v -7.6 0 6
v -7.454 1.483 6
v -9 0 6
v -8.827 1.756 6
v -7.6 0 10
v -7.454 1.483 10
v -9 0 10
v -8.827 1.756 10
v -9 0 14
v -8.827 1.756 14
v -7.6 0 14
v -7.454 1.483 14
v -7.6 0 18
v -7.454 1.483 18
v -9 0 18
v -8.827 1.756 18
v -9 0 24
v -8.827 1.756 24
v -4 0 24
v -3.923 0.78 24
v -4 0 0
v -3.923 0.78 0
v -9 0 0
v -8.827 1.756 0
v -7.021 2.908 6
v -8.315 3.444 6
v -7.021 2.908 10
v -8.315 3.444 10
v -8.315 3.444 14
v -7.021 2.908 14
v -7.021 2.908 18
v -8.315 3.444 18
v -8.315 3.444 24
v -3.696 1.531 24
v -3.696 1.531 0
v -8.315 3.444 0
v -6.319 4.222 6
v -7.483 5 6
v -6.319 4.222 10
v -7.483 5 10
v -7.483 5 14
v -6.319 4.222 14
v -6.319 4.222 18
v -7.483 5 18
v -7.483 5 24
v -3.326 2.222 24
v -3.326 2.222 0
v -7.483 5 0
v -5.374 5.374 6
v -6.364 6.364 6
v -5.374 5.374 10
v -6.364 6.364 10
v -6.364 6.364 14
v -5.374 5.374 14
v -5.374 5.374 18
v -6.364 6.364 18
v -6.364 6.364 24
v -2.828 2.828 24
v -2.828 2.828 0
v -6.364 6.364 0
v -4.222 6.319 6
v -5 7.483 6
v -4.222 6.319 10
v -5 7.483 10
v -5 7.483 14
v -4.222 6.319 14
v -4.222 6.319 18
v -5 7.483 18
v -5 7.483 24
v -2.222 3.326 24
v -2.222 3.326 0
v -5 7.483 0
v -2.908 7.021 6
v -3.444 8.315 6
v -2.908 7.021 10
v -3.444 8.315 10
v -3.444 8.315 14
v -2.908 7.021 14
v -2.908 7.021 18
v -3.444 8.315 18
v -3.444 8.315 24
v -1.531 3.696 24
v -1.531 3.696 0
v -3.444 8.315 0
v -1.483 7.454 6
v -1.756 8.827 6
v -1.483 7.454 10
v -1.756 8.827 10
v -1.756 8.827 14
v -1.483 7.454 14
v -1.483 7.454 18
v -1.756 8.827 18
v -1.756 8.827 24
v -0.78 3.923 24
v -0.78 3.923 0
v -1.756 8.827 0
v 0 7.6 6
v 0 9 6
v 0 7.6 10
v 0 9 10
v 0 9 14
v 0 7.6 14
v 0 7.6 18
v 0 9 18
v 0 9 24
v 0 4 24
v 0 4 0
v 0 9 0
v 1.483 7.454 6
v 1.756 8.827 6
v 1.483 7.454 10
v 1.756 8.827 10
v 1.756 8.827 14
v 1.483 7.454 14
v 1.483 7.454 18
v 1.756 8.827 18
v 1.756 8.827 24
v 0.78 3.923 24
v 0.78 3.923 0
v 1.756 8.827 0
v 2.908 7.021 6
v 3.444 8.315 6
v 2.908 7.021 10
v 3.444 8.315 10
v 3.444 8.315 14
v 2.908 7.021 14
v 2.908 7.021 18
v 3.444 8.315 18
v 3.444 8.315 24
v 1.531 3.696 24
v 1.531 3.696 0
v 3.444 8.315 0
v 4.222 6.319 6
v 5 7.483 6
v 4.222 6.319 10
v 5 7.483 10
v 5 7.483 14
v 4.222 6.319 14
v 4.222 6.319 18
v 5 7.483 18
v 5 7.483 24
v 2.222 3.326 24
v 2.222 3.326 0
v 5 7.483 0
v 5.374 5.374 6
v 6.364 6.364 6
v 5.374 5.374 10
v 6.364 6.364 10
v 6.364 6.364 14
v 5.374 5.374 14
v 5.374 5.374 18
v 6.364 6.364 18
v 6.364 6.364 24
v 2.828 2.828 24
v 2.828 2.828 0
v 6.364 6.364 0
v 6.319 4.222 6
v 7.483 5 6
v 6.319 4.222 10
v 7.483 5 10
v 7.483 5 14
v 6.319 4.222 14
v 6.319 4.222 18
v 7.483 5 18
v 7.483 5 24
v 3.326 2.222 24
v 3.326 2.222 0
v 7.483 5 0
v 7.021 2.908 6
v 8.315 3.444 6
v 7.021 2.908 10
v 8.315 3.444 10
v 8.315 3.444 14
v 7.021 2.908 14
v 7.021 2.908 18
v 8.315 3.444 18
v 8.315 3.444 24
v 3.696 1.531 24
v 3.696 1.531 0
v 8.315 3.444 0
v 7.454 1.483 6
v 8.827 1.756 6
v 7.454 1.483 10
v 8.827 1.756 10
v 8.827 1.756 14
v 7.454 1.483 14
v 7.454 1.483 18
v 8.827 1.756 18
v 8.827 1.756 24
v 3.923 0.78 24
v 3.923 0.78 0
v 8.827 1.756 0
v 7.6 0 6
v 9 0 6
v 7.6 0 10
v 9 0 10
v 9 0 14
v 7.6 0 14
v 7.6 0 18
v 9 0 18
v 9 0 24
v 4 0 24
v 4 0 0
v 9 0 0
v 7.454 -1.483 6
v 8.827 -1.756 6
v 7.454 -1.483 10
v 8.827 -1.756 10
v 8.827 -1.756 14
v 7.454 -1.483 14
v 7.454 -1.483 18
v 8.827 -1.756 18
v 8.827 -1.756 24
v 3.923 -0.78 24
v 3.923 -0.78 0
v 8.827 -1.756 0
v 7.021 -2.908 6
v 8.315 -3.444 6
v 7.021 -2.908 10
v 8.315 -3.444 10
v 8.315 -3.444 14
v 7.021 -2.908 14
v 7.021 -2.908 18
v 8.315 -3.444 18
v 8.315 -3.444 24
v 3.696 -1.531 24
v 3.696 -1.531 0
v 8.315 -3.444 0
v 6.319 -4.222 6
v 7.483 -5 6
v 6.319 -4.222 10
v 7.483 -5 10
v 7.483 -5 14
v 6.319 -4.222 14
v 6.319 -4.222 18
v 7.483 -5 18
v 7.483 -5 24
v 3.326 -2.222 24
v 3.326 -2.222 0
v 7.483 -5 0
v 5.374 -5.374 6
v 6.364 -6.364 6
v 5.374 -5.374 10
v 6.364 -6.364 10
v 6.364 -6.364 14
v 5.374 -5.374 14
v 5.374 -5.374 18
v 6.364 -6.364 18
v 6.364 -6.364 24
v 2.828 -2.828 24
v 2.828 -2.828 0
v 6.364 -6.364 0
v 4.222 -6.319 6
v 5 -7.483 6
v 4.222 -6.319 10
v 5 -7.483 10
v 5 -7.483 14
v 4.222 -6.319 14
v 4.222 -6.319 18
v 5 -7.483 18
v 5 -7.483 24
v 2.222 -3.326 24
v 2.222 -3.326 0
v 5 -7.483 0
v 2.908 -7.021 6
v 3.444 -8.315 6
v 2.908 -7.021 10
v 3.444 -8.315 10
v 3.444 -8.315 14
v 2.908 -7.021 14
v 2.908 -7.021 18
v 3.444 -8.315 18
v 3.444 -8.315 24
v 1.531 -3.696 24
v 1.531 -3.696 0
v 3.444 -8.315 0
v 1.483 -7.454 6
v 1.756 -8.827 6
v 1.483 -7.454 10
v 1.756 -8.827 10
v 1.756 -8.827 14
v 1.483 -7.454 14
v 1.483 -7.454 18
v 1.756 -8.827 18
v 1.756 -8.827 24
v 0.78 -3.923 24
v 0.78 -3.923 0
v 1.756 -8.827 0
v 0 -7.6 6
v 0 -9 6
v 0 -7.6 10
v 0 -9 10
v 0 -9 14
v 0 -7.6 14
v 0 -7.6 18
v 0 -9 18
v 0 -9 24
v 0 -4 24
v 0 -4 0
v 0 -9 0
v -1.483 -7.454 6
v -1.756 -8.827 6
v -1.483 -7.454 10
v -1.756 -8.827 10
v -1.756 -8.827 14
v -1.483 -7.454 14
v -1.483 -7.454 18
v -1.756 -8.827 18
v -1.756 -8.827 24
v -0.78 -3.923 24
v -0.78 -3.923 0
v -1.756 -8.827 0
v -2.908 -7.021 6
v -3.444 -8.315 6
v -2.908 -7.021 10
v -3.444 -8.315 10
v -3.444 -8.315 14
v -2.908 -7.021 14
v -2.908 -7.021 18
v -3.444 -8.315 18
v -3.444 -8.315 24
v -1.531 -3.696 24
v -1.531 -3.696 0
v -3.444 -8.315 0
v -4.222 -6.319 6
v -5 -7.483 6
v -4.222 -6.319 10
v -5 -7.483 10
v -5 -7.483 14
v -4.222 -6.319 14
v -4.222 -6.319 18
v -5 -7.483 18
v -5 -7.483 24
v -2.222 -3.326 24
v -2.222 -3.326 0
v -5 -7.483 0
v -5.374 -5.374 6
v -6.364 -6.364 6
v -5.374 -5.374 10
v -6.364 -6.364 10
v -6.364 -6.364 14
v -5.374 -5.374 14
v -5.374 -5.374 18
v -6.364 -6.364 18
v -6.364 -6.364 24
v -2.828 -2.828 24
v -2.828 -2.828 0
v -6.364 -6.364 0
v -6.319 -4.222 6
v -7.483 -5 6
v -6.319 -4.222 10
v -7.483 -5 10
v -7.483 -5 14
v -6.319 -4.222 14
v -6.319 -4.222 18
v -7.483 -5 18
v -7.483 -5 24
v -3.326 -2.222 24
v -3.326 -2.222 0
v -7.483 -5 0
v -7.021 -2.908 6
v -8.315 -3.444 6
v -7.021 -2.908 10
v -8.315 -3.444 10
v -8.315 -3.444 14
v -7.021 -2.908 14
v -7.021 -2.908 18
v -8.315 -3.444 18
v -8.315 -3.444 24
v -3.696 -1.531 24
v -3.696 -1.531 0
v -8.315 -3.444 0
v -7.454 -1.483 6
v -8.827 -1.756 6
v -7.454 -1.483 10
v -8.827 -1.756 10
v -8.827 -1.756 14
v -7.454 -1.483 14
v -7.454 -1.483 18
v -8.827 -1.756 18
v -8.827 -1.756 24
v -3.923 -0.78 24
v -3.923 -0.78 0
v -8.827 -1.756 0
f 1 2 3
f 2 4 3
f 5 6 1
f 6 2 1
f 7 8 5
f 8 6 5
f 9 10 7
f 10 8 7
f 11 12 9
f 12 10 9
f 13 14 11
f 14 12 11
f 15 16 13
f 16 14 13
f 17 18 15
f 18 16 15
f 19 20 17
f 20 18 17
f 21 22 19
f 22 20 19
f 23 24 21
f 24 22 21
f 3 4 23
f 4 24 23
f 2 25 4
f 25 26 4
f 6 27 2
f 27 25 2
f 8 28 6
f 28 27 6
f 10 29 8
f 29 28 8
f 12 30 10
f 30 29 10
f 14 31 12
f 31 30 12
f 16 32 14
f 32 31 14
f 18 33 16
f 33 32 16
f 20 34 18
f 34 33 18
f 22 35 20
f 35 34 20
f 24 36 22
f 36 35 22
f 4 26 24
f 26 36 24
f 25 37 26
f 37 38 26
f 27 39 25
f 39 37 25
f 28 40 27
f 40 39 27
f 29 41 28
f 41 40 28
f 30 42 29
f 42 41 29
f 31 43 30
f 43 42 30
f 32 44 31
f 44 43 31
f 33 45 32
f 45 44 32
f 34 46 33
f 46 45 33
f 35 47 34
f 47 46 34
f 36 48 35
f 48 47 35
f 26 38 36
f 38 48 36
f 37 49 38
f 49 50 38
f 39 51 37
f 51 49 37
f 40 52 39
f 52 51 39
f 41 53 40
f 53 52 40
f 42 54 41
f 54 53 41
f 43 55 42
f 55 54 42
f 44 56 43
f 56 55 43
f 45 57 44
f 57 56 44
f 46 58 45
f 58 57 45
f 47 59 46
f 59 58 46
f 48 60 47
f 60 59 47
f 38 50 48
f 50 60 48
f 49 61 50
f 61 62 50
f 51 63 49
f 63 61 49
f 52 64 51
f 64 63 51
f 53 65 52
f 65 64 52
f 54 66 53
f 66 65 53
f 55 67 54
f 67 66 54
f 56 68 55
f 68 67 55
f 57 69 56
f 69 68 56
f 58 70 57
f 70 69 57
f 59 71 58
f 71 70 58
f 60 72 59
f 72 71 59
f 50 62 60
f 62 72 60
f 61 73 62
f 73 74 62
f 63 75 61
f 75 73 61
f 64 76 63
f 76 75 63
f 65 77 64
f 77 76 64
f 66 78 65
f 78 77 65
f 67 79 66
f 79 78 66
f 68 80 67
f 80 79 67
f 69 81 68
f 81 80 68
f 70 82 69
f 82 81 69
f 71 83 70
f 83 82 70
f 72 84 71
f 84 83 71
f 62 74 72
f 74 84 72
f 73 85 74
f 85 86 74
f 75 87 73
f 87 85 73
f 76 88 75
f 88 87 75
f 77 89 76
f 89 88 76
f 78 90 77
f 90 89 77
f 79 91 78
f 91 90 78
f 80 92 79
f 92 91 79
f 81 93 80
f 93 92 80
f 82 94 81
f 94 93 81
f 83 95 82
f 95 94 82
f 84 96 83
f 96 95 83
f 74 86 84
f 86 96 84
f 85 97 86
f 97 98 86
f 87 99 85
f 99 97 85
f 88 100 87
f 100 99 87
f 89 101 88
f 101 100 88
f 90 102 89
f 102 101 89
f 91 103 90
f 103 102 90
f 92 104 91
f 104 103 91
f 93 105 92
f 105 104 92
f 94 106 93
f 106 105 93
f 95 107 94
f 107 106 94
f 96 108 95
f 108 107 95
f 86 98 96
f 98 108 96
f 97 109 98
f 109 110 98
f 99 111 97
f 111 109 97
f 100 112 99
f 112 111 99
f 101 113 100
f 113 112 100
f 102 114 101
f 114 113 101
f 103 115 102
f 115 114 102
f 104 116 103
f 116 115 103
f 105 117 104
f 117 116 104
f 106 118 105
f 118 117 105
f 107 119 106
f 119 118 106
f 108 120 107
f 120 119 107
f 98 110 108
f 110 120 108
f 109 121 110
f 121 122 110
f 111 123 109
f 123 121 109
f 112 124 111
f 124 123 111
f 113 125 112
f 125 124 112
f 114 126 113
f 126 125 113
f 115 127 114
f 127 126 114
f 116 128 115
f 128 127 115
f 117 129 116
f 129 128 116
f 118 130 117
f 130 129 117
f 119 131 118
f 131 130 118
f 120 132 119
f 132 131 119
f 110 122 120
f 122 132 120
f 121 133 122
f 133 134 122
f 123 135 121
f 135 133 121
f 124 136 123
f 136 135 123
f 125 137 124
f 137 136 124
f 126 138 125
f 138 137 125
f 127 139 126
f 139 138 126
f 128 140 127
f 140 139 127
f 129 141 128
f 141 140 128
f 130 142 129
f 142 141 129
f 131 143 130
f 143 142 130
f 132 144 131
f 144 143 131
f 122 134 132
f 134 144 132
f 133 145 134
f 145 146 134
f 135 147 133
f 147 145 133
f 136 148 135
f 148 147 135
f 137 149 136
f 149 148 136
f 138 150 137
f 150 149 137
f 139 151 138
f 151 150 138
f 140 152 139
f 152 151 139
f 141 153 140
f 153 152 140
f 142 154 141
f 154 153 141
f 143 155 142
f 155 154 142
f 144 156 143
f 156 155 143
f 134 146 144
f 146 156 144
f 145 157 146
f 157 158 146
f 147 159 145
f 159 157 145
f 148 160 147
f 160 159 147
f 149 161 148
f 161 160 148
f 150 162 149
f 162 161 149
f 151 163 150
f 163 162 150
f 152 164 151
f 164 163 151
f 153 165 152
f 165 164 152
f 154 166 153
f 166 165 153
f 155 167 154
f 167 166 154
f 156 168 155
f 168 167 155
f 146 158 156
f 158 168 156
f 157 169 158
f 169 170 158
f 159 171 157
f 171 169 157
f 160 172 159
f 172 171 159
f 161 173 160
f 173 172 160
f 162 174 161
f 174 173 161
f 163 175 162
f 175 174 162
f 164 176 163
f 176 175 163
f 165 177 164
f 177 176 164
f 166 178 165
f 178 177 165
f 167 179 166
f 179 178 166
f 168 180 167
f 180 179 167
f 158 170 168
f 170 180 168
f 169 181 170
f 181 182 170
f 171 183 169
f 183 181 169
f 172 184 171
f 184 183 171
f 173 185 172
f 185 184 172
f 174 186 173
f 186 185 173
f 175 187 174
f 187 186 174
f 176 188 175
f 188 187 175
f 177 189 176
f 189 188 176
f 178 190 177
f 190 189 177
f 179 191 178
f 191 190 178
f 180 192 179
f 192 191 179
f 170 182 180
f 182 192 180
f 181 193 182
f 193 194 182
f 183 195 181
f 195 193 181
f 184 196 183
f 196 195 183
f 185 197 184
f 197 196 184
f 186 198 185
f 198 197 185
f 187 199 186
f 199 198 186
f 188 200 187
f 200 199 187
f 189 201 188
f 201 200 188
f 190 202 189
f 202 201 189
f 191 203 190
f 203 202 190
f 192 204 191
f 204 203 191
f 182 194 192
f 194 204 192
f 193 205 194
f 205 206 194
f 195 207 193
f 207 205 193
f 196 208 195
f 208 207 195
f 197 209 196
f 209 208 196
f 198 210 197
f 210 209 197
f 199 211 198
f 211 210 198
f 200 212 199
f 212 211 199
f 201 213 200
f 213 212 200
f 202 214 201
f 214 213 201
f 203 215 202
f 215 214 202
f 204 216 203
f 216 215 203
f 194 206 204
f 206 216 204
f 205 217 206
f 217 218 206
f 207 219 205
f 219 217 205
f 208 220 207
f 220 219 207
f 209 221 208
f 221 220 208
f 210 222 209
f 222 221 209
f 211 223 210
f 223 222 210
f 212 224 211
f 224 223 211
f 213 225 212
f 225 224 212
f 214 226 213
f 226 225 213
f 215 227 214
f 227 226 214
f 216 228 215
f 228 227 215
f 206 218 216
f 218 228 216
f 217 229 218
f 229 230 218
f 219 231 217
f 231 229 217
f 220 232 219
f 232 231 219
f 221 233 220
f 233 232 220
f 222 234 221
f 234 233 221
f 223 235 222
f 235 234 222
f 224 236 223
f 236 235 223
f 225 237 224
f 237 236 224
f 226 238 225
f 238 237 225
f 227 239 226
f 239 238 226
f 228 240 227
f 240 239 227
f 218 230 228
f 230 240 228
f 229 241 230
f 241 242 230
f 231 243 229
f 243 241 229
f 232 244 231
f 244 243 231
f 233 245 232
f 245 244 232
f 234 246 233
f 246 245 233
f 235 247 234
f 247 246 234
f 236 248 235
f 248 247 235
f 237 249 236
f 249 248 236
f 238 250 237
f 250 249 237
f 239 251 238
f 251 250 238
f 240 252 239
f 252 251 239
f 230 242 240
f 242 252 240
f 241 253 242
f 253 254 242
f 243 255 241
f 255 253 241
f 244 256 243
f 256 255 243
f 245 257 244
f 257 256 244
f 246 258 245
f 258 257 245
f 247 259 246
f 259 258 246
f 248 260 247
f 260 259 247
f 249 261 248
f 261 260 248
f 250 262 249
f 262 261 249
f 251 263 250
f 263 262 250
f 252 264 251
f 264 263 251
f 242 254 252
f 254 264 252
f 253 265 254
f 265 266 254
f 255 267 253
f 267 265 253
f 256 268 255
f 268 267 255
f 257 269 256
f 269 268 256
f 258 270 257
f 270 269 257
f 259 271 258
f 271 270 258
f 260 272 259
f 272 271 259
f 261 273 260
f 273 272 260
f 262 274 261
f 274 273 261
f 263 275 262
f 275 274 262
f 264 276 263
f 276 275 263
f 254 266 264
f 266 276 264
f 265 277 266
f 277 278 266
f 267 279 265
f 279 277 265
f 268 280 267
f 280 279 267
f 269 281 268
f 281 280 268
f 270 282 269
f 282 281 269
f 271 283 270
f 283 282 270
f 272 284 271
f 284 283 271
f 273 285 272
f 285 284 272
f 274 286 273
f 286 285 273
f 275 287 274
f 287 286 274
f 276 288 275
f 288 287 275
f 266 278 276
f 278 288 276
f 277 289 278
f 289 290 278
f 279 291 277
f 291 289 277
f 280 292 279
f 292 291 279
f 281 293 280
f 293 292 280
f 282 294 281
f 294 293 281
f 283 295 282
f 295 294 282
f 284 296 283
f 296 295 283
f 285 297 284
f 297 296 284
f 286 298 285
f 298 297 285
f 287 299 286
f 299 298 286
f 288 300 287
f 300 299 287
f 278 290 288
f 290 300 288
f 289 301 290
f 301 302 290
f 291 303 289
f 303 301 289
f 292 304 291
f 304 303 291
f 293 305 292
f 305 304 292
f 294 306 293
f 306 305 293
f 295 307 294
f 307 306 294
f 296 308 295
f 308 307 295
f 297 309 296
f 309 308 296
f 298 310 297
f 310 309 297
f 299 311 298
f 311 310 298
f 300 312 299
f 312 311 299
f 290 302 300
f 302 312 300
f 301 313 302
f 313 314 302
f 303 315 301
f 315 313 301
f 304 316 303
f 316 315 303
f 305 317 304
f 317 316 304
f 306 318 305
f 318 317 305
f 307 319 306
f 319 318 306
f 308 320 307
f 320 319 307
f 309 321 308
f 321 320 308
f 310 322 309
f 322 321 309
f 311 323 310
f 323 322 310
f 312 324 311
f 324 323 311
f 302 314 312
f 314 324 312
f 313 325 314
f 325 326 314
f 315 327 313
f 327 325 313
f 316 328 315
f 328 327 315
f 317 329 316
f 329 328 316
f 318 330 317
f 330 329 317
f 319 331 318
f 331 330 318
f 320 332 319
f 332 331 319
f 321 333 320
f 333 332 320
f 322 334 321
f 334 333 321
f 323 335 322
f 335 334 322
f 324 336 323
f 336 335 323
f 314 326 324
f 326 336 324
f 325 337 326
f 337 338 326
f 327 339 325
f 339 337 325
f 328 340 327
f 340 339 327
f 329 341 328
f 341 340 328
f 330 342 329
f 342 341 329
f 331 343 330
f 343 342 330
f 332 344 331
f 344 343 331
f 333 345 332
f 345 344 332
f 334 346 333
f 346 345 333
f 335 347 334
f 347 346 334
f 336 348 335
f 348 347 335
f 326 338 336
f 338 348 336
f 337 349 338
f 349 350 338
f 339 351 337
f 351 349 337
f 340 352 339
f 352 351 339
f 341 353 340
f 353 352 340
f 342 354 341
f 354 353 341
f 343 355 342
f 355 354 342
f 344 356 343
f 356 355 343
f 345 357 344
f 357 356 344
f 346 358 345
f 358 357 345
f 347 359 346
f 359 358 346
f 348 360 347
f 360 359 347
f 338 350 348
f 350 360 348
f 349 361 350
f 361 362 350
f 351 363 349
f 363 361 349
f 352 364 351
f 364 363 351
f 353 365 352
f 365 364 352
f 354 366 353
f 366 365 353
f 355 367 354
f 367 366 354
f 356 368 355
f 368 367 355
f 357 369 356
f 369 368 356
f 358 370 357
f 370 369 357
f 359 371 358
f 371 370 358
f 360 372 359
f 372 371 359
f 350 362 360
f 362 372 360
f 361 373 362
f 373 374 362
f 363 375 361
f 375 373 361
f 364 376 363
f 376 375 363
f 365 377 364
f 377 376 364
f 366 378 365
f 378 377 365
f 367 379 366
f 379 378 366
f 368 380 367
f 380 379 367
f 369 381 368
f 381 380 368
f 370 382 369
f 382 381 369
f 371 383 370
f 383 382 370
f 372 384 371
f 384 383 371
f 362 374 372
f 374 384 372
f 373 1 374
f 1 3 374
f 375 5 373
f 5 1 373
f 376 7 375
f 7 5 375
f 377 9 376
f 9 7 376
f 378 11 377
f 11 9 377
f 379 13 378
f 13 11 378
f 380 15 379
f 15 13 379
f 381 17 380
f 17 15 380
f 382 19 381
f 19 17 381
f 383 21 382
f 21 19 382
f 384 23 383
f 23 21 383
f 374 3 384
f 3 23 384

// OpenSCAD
$fn = 32;

// ----------------------------------------------------------------------
// Grooved revolve: stepped, bore R4
// ----------------------------------------------------------------------

// --- parameters (mm) ---
bore_r = 4;               // bore radius
outer_r = 9;              // outer radius of the body
total_h = 24;             // overall height, Z
wall = 5;                 // radial wall thickness
groove_w = 4;             // groove width
groove_d = 1.4;           // groove depth
grooves = 2;              // number of outer grooves

bbox_x = 2 * outer_r;  // full diameter
bore_d = 2 * bore_r;  // bore diameter
body_d = 2 * outer_r;  // body diameter
revolve_angle = 360;  // full turn around the Z axis

profile = [[4, 0], [9, 0], [9, 6], [7.6, 6], [7.6, 10], [9, 10], [9, 14], [7.6, 14], [7.6, 18], [9, 18], [9, 24], [4, 24]];  // primary outline, 12 points, counter clockwise

// --- the one profile operation ---
rotate_extrude(angle = revolve_angle) polygon(points = profile);
